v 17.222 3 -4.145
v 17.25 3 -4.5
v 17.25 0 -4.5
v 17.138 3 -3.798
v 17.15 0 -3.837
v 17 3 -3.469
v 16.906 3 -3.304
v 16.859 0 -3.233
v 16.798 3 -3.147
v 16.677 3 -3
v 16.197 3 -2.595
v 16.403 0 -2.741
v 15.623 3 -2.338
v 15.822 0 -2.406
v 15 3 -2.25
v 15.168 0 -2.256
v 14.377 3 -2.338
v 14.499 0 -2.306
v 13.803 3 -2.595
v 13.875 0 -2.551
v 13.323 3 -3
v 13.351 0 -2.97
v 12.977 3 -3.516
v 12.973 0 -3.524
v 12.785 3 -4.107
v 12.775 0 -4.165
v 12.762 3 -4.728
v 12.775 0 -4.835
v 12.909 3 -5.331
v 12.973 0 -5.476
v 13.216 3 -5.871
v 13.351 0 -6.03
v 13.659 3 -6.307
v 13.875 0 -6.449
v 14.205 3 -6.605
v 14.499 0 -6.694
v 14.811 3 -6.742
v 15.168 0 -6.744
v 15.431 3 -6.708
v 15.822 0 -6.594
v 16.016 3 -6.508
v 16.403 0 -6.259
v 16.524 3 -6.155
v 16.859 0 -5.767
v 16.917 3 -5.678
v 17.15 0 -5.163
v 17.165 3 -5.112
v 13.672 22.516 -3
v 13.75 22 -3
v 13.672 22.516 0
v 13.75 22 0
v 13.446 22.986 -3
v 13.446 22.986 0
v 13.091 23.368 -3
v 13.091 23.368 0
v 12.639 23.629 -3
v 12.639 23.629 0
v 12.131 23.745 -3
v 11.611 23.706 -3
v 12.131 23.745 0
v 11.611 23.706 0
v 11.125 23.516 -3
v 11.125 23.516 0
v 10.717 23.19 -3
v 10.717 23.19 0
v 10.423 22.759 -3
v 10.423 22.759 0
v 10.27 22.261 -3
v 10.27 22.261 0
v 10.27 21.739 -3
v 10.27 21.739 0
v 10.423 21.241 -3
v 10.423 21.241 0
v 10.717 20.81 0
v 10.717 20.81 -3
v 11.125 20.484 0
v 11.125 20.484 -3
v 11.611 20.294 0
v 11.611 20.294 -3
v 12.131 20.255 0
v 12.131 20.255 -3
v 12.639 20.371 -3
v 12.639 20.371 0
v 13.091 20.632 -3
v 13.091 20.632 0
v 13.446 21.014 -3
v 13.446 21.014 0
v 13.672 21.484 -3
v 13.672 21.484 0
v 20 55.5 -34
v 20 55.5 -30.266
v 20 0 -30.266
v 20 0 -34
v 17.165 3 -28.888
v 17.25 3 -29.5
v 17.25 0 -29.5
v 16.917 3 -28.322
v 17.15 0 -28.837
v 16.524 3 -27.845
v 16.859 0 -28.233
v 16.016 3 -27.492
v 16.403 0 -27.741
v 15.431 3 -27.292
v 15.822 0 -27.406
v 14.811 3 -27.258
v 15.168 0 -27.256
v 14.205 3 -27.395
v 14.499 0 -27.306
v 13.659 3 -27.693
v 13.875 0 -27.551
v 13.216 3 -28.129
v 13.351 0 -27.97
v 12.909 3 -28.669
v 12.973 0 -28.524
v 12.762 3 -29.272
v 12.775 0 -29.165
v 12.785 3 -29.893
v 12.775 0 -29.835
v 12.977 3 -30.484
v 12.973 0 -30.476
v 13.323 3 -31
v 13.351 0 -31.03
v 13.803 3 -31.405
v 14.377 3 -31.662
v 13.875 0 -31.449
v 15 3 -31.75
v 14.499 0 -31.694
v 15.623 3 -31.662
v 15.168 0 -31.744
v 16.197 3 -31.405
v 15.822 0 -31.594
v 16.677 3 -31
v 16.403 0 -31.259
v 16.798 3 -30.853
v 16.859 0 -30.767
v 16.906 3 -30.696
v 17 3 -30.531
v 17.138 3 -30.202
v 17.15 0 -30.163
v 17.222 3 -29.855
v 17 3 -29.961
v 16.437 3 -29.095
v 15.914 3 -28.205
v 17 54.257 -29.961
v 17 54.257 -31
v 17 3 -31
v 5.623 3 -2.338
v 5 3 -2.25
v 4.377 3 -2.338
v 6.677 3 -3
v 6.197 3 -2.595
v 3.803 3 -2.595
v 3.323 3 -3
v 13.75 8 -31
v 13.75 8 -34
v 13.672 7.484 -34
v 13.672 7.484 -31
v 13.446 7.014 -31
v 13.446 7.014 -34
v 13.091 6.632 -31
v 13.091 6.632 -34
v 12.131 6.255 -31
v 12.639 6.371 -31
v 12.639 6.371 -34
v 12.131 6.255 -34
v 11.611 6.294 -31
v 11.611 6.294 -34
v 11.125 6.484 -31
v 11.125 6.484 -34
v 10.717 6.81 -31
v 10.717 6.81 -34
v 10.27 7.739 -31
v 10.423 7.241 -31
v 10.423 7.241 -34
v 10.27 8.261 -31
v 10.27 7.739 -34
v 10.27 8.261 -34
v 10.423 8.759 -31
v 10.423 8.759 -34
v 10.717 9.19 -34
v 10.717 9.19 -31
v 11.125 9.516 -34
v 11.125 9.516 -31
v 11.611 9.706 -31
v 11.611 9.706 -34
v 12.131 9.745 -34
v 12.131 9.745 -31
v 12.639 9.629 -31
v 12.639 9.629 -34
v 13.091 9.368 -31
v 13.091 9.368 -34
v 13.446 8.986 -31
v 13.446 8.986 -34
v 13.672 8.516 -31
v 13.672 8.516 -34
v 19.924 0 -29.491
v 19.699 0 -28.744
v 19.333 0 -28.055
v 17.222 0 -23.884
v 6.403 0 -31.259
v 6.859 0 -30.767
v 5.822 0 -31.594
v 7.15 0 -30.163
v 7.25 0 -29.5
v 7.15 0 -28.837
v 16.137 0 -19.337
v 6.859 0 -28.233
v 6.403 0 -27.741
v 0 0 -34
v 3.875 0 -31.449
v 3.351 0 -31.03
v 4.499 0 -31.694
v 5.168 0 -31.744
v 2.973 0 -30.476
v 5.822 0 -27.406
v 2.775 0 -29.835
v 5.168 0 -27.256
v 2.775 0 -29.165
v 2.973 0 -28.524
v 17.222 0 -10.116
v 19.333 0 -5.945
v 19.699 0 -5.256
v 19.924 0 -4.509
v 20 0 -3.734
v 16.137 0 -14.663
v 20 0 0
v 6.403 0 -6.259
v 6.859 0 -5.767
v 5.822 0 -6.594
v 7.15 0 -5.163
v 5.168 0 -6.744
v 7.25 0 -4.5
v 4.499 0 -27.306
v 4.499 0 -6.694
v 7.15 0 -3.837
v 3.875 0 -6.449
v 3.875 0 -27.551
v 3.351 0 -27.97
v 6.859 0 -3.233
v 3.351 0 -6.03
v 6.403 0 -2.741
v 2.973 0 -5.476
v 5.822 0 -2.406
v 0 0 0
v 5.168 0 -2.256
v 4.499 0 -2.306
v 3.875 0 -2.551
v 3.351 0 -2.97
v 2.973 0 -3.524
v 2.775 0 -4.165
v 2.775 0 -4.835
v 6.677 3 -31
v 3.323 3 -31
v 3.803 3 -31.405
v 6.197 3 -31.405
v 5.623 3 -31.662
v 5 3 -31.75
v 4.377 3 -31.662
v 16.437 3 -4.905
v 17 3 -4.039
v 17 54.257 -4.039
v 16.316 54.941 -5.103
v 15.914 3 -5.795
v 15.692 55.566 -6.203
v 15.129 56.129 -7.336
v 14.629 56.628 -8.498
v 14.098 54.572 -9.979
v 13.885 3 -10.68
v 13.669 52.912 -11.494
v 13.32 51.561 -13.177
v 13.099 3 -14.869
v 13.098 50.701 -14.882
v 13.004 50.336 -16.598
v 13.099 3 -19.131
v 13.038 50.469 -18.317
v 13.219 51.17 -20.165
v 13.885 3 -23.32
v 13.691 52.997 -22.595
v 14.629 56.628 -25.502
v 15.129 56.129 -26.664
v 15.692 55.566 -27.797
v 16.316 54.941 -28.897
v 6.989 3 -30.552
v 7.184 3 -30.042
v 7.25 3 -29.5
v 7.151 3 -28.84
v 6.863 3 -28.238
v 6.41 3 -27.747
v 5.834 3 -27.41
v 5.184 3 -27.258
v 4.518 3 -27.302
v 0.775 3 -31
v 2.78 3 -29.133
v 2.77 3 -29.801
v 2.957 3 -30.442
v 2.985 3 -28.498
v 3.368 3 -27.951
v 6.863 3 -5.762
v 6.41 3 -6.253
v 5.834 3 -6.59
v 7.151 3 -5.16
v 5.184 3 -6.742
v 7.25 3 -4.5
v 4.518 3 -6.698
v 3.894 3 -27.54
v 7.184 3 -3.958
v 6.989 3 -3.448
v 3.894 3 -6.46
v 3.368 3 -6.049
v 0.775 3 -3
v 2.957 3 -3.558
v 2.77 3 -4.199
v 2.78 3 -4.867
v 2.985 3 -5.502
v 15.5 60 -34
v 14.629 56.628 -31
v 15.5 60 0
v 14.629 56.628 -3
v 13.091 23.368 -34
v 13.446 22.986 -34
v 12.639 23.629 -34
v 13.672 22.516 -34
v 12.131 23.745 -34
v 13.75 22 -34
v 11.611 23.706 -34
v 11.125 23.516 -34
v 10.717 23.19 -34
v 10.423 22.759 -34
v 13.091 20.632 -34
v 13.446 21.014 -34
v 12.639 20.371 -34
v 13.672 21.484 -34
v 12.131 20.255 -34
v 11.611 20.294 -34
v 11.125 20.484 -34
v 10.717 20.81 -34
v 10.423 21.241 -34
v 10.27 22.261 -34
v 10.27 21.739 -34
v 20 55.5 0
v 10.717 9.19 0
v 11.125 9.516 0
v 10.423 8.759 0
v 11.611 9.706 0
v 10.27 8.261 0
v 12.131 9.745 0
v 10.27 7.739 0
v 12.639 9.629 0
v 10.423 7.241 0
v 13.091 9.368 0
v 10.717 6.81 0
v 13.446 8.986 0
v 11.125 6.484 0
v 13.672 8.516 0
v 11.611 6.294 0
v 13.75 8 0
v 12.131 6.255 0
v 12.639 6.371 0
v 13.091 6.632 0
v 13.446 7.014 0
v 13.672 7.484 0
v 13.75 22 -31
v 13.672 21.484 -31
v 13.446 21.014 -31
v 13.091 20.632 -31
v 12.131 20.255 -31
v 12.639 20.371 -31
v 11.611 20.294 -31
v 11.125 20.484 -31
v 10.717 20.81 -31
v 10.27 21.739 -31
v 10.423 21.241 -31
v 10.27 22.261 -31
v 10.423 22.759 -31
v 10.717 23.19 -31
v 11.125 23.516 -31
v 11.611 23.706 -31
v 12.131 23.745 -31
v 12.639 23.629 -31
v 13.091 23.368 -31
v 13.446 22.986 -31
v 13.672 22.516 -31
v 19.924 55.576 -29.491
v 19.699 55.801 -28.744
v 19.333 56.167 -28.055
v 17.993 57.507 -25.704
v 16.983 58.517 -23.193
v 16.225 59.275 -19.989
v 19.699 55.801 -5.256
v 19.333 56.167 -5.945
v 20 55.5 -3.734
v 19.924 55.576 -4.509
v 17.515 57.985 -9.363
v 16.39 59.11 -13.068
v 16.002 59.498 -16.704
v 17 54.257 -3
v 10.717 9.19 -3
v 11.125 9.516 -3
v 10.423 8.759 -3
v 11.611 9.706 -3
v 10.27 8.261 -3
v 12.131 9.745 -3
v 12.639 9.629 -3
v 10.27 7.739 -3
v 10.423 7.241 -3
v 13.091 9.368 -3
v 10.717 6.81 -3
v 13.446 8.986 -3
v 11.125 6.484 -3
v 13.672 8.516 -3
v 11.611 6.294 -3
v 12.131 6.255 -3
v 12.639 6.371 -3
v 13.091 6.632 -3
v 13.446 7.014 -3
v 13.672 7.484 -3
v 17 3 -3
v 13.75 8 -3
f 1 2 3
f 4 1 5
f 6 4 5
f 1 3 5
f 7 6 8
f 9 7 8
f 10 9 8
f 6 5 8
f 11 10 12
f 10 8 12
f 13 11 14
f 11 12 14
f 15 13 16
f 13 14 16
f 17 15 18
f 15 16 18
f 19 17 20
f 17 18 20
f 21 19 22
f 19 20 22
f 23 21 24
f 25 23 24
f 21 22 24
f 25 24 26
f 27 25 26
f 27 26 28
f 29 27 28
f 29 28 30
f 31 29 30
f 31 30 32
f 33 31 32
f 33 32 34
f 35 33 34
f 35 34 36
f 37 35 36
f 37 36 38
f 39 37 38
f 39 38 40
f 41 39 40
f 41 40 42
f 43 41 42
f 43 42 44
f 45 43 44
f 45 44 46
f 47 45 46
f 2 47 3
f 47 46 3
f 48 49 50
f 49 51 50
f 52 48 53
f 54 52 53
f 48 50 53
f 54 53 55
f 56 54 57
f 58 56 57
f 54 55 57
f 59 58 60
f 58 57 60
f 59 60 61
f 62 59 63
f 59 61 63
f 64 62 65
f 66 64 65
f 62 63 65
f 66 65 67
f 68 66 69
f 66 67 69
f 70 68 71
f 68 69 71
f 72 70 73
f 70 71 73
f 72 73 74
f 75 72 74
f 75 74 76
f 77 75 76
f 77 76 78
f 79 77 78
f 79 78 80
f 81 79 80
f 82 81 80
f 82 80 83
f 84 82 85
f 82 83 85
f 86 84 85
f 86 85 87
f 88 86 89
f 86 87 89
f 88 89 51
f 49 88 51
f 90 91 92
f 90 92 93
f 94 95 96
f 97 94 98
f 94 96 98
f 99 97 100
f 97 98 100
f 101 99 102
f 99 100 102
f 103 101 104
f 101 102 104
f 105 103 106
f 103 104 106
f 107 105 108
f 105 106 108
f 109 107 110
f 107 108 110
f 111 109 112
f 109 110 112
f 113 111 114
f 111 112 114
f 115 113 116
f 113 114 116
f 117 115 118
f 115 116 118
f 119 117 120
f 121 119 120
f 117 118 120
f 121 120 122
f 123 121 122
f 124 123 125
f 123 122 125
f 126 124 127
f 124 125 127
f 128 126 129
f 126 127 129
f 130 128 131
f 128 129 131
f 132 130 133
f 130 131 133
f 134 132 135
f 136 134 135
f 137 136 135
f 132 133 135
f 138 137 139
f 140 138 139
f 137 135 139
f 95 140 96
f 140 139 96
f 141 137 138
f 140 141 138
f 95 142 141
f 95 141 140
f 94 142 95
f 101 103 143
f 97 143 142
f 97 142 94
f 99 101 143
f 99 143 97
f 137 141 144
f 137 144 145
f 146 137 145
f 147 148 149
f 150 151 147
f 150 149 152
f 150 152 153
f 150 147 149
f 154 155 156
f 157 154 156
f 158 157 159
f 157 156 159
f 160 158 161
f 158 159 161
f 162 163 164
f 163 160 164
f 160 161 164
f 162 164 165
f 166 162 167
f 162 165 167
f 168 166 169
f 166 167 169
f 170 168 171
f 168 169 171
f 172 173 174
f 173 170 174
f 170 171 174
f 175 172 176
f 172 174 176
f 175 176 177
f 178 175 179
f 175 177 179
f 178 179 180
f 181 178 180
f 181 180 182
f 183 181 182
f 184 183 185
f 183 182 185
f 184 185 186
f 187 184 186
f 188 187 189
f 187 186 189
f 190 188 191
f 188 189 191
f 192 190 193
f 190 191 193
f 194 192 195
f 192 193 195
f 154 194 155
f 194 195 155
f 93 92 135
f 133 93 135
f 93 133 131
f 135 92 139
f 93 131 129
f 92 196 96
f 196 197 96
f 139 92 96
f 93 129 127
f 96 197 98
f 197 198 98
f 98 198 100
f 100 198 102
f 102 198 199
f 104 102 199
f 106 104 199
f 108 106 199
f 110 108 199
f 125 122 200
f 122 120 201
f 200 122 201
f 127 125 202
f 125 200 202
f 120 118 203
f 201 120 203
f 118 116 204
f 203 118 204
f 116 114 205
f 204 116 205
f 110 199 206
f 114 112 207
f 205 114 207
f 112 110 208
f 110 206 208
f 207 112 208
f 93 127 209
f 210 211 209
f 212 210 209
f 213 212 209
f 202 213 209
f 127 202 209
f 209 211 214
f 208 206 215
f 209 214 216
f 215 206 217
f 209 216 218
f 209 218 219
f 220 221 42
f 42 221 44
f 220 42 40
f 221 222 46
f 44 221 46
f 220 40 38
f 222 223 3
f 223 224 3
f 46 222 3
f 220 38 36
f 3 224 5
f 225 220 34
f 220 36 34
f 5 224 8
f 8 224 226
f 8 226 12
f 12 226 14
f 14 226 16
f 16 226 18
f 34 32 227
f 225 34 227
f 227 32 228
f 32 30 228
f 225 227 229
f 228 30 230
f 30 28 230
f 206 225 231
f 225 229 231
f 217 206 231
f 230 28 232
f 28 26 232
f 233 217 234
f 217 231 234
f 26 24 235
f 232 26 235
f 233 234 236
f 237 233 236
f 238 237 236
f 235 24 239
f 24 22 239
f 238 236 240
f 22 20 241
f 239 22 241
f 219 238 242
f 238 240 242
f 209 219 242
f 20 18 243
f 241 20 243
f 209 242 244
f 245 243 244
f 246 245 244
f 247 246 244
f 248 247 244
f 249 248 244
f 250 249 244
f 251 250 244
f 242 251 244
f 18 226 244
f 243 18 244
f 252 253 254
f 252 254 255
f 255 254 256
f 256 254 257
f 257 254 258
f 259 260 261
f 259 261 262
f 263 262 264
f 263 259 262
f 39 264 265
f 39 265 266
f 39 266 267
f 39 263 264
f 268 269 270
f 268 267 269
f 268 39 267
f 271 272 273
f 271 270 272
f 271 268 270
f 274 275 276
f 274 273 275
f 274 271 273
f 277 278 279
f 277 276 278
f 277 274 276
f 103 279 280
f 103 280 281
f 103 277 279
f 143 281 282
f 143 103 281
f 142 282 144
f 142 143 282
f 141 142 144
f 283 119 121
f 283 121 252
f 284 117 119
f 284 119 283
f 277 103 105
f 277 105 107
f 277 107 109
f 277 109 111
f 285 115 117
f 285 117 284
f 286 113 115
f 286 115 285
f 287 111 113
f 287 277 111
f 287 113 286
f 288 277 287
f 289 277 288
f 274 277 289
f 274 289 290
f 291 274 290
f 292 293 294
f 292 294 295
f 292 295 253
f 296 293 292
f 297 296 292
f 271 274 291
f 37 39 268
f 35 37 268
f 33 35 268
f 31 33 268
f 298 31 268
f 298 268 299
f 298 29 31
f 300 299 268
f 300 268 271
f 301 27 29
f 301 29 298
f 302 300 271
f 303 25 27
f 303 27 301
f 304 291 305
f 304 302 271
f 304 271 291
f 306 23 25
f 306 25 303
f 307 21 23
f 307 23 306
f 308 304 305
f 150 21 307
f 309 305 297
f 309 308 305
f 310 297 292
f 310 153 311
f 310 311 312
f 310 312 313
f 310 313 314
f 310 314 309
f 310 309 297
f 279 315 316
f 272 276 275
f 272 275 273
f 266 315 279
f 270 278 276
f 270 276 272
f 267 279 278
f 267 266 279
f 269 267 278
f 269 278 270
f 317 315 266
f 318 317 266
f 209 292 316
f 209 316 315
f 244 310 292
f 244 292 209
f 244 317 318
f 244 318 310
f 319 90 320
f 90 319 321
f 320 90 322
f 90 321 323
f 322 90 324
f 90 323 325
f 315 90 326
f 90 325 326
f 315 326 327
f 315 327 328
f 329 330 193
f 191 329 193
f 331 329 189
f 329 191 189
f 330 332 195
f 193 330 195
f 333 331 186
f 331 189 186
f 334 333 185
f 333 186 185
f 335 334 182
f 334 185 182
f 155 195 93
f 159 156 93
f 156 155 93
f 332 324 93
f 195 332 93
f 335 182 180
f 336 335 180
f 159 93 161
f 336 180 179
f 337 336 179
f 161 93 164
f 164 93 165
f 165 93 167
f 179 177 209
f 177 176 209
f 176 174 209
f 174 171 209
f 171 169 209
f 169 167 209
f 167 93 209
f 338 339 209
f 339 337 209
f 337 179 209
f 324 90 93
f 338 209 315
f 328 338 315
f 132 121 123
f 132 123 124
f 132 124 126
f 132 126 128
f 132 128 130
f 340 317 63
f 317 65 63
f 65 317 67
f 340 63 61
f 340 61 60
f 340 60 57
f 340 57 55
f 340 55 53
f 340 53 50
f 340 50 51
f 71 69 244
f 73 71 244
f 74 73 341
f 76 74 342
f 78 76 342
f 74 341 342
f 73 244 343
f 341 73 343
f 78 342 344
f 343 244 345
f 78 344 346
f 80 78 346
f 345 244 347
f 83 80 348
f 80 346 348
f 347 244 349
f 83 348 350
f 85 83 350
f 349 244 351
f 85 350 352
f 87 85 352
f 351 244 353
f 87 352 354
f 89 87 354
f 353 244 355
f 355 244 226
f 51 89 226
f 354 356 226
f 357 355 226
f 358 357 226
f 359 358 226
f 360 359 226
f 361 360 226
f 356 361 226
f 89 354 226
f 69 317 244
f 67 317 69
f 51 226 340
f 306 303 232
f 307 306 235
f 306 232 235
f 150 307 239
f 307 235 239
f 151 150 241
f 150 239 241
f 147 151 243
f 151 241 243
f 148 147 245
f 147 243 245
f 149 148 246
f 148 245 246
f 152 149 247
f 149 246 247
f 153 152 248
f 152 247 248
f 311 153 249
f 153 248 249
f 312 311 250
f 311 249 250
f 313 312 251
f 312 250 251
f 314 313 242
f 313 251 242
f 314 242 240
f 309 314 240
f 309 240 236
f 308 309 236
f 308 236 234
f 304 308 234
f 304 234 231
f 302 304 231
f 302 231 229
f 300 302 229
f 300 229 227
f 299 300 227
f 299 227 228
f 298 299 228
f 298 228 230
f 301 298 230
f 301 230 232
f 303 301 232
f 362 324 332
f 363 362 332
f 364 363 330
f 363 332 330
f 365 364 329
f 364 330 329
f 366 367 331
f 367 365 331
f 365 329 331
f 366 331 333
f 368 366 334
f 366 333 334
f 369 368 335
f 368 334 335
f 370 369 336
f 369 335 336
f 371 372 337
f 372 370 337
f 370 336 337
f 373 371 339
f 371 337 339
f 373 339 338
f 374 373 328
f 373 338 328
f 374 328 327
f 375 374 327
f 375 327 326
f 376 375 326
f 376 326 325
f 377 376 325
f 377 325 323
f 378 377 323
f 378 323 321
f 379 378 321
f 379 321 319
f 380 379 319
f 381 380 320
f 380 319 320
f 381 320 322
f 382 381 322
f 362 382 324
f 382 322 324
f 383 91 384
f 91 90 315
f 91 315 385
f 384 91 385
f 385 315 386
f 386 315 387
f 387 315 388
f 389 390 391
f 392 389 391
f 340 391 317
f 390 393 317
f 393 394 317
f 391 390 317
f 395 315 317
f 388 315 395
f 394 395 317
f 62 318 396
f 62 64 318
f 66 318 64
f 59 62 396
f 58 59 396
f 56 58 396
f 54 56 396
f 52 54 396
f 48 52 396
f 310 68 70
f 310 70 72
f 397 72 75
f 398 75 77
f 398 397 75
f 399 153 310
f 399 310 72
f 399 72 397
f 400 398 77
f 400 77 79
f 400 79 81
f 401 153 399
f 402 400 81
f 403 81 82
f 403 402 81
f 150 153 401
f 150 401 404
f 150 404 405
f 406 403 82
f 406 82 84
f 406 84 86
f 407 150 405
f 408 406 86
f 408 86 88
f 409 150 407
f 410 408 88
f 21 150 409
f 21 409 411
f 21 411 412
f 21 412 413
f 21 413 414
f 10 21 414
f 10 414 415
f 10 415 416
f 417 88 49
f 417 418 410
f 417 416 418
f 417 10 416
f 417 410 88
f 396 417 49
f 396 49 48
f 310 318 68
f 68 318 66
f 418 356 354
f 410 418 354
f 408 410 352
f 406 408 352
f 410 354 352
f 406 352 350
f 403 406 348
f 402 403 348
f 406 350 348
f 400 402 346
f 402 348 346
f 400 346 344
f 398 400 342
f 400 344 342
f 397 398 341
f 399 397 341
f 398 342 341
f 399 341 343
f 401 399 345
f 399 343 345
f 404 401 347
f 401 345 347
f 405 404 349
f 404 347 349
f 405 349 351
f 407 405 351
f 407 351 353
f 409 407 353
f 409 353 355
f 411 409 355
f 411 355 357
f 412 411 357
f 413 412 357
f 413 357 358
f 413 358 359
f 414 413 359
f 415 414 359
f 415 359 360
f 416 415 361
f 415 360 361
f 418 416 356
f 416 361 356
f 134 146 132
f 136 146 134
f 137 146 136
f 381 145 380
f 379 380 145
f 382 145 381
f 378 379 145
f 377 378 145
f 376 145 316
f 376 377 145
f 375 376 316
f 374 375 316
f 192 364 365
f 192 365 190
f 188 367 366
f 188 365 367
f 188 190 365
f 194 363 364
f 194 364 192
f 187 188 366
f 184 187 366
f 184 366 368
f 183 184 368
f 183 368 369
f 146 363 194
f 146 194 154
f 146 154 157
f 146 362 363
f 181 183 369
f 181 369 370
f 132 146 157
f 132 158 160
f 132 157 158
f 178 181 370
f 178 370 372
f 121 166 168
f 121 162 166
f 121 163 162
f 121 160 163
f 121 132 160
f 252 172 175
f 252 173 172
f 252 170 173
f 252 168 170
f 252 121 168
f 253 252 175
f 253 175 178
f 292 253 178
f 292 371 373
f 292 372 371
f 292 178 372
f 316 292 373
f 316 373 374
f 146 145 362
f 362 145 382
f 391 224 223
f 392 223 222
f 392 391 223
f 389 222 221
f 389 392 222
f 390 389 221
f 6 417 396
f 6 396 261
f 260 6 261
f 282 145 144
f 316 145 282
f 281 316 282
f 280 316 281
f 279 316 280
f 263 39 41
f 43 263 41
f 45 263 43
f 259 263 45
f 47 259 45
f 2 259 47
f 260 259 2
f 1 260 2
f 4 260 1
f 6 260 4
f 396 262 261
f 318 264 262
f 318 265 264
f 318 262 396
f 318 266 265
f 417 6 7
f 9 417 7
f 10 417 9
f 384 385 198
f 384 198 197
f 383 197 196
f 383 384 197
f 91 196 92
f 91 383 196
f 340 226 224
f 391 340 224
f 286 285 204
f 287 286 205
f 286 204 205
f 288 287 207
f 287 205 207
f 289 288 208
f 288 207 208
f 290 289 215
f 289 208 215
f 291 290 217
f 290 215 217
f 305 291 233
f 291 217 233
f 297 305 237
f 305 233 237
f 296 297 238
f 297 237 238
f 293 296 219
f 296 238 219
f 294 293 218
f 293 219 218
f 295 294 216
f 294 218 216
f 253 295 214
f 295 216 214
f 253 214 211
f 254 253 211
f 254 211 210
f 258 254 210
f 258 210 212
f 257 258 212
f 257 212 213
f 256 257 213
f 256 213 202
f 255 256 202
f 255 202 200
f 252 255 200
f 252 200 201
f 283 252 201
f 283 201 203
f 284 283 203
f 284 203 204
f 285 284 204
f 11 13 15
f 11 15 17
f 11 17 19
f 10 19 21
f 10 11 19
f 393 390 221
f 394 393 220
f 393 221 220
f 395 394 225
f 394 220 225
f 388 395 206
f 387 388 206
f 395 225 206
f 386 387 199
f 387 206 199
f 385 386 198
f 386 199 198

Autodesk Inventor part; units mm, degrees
ref_plane "YZ Plane" through (0, 0, 0) normal (1, 0, 0) x (0, 1, 0)
ref_plane "XZ Plane" through (0, 0, 0) normal (0, 1, 0) x (-1, 0, 0)
sketch "Sketch1" plane through (0, 0, 0) normal (0, 1, 0) x (-1, 0, 0)
  line L0 (0, 0) -> (-20, 0)
  line L1 (-20, 0) -> (-20, -34)
  line L2 (-20, -34) -> (0, -34)
  line L3 (0, -34) -> (0, 0)
  dimension "d0" = 34
  dimension "d1" = 20
extrude "Extrusion1" add sketch "Sketch1" along normal blind 60
chamfer "Chamfer1" distance 4.5 angle 45 1 edges at (20, 60, -17)
sketch "Sketch3" plane through (0, 0, 0) normal (0, 0, 1) x (1, 0, 0)
  line L0 (0, 60) -> (15.5, 60) projected
  line L1 (15.5, 60) -> (0, 0)
  line L2 (0, 0) -> (20, 0) projected
  line L3 (20, 0) -> (0, 0)
  line L4 (0, 0) -> (0, 60)
  line L5 (0, 60) -> (20, 60)
  line L6 (20, 60) -> (20, 0)
extrude "Extrusion2" cut sketch "Sketch3" against normal blind 60 contours L0 L1 L4
sketch "Sketch8" plane through (0, 0, 0) normal (0, -1, 0) x (1, 0, 0)
  line L0 (20, 0) -> (20, -34) projected
  line L1 (20, -17) -> (36, -17) construction
  circle A0 centre (36, -17) radius 20
  point P0 (0, 0)
  point P1 (20, -29)
  point P2 (20, -5)
  dimension "d44" = 40
  dimension "d45" = 16
extrude "Extrusion7" cut sketch "Sketch8" against normal through all contours L0 A0 picked at (19.2708, -19.7731)
shell "Shell2" thickness 3 removed faces 1 at (10.3333, 40, -22.6667)
sketch "Sketch9" plane through (0, 0, 0) normal (0, -1, 0) x (1, 0, 0)
  circle A0 centre (5, -4.5) radius 2.25
  line L0 (0, 0) -> (20, 0) projected
  line L1 (0, -34) -> (0, 0) projected
  line L2 (5, -4.5) -> (15, -4.5) construction
  line L3 (14.629, -8.4982) -> (14.629, -3) projected
  line L4 (5, -4.5) -> (15, -4.5) construction
  circle A1 centre (15, -4.5) radius 2.25
  line L5 (0, -17) -> (10, -17) construction
  circle A2 centre (5, -29.5) radius 2.25
  circle A3 centre (15, -29.5) radius 2.25
  dimension "d49" = 4.5
  dimension "d50" = 4.5
  dimension "d51" = 5
  dimension "d52" = 10
  dimension "d53" = 360
  dimension "d54" = 4.5
  dimension "d56" = 25
extrude "Extrusion8" cut sketch "Sketch9" against normal blind 3
fillet "Fillet2" radius 4 2 edges at (20, 27.75, -5) (20, 27.75, -29)
sketch "Sketch10" plane through (20, 0, 0) normal (0, 0, 1) x (1, 0, 0)
  circle A0 centre (-8, 8) radius 1.75
  line L0 (-8, 8) -> (-8, 22) construction
  circle A1 centre (-8, 22) radius 1.75
  point P0 (-20, 0)
  dimension "d60" = 3.5
  dimension "d61" = 12
  dimension "d62" = 8
  dimension "d64" = 3.5
extrude "Extrusion9" cut sketch "Sketch10" against normal blind 3
ref_plane "Work Plane1" through (0, 0, -17) normal (0, 0, 1) x (1, 0, 0)
mirror "Mirror1" about plane through (0, 0, -17) normal (0, 0, 1) of "Extrusion9"
properties part number "Gripper"
